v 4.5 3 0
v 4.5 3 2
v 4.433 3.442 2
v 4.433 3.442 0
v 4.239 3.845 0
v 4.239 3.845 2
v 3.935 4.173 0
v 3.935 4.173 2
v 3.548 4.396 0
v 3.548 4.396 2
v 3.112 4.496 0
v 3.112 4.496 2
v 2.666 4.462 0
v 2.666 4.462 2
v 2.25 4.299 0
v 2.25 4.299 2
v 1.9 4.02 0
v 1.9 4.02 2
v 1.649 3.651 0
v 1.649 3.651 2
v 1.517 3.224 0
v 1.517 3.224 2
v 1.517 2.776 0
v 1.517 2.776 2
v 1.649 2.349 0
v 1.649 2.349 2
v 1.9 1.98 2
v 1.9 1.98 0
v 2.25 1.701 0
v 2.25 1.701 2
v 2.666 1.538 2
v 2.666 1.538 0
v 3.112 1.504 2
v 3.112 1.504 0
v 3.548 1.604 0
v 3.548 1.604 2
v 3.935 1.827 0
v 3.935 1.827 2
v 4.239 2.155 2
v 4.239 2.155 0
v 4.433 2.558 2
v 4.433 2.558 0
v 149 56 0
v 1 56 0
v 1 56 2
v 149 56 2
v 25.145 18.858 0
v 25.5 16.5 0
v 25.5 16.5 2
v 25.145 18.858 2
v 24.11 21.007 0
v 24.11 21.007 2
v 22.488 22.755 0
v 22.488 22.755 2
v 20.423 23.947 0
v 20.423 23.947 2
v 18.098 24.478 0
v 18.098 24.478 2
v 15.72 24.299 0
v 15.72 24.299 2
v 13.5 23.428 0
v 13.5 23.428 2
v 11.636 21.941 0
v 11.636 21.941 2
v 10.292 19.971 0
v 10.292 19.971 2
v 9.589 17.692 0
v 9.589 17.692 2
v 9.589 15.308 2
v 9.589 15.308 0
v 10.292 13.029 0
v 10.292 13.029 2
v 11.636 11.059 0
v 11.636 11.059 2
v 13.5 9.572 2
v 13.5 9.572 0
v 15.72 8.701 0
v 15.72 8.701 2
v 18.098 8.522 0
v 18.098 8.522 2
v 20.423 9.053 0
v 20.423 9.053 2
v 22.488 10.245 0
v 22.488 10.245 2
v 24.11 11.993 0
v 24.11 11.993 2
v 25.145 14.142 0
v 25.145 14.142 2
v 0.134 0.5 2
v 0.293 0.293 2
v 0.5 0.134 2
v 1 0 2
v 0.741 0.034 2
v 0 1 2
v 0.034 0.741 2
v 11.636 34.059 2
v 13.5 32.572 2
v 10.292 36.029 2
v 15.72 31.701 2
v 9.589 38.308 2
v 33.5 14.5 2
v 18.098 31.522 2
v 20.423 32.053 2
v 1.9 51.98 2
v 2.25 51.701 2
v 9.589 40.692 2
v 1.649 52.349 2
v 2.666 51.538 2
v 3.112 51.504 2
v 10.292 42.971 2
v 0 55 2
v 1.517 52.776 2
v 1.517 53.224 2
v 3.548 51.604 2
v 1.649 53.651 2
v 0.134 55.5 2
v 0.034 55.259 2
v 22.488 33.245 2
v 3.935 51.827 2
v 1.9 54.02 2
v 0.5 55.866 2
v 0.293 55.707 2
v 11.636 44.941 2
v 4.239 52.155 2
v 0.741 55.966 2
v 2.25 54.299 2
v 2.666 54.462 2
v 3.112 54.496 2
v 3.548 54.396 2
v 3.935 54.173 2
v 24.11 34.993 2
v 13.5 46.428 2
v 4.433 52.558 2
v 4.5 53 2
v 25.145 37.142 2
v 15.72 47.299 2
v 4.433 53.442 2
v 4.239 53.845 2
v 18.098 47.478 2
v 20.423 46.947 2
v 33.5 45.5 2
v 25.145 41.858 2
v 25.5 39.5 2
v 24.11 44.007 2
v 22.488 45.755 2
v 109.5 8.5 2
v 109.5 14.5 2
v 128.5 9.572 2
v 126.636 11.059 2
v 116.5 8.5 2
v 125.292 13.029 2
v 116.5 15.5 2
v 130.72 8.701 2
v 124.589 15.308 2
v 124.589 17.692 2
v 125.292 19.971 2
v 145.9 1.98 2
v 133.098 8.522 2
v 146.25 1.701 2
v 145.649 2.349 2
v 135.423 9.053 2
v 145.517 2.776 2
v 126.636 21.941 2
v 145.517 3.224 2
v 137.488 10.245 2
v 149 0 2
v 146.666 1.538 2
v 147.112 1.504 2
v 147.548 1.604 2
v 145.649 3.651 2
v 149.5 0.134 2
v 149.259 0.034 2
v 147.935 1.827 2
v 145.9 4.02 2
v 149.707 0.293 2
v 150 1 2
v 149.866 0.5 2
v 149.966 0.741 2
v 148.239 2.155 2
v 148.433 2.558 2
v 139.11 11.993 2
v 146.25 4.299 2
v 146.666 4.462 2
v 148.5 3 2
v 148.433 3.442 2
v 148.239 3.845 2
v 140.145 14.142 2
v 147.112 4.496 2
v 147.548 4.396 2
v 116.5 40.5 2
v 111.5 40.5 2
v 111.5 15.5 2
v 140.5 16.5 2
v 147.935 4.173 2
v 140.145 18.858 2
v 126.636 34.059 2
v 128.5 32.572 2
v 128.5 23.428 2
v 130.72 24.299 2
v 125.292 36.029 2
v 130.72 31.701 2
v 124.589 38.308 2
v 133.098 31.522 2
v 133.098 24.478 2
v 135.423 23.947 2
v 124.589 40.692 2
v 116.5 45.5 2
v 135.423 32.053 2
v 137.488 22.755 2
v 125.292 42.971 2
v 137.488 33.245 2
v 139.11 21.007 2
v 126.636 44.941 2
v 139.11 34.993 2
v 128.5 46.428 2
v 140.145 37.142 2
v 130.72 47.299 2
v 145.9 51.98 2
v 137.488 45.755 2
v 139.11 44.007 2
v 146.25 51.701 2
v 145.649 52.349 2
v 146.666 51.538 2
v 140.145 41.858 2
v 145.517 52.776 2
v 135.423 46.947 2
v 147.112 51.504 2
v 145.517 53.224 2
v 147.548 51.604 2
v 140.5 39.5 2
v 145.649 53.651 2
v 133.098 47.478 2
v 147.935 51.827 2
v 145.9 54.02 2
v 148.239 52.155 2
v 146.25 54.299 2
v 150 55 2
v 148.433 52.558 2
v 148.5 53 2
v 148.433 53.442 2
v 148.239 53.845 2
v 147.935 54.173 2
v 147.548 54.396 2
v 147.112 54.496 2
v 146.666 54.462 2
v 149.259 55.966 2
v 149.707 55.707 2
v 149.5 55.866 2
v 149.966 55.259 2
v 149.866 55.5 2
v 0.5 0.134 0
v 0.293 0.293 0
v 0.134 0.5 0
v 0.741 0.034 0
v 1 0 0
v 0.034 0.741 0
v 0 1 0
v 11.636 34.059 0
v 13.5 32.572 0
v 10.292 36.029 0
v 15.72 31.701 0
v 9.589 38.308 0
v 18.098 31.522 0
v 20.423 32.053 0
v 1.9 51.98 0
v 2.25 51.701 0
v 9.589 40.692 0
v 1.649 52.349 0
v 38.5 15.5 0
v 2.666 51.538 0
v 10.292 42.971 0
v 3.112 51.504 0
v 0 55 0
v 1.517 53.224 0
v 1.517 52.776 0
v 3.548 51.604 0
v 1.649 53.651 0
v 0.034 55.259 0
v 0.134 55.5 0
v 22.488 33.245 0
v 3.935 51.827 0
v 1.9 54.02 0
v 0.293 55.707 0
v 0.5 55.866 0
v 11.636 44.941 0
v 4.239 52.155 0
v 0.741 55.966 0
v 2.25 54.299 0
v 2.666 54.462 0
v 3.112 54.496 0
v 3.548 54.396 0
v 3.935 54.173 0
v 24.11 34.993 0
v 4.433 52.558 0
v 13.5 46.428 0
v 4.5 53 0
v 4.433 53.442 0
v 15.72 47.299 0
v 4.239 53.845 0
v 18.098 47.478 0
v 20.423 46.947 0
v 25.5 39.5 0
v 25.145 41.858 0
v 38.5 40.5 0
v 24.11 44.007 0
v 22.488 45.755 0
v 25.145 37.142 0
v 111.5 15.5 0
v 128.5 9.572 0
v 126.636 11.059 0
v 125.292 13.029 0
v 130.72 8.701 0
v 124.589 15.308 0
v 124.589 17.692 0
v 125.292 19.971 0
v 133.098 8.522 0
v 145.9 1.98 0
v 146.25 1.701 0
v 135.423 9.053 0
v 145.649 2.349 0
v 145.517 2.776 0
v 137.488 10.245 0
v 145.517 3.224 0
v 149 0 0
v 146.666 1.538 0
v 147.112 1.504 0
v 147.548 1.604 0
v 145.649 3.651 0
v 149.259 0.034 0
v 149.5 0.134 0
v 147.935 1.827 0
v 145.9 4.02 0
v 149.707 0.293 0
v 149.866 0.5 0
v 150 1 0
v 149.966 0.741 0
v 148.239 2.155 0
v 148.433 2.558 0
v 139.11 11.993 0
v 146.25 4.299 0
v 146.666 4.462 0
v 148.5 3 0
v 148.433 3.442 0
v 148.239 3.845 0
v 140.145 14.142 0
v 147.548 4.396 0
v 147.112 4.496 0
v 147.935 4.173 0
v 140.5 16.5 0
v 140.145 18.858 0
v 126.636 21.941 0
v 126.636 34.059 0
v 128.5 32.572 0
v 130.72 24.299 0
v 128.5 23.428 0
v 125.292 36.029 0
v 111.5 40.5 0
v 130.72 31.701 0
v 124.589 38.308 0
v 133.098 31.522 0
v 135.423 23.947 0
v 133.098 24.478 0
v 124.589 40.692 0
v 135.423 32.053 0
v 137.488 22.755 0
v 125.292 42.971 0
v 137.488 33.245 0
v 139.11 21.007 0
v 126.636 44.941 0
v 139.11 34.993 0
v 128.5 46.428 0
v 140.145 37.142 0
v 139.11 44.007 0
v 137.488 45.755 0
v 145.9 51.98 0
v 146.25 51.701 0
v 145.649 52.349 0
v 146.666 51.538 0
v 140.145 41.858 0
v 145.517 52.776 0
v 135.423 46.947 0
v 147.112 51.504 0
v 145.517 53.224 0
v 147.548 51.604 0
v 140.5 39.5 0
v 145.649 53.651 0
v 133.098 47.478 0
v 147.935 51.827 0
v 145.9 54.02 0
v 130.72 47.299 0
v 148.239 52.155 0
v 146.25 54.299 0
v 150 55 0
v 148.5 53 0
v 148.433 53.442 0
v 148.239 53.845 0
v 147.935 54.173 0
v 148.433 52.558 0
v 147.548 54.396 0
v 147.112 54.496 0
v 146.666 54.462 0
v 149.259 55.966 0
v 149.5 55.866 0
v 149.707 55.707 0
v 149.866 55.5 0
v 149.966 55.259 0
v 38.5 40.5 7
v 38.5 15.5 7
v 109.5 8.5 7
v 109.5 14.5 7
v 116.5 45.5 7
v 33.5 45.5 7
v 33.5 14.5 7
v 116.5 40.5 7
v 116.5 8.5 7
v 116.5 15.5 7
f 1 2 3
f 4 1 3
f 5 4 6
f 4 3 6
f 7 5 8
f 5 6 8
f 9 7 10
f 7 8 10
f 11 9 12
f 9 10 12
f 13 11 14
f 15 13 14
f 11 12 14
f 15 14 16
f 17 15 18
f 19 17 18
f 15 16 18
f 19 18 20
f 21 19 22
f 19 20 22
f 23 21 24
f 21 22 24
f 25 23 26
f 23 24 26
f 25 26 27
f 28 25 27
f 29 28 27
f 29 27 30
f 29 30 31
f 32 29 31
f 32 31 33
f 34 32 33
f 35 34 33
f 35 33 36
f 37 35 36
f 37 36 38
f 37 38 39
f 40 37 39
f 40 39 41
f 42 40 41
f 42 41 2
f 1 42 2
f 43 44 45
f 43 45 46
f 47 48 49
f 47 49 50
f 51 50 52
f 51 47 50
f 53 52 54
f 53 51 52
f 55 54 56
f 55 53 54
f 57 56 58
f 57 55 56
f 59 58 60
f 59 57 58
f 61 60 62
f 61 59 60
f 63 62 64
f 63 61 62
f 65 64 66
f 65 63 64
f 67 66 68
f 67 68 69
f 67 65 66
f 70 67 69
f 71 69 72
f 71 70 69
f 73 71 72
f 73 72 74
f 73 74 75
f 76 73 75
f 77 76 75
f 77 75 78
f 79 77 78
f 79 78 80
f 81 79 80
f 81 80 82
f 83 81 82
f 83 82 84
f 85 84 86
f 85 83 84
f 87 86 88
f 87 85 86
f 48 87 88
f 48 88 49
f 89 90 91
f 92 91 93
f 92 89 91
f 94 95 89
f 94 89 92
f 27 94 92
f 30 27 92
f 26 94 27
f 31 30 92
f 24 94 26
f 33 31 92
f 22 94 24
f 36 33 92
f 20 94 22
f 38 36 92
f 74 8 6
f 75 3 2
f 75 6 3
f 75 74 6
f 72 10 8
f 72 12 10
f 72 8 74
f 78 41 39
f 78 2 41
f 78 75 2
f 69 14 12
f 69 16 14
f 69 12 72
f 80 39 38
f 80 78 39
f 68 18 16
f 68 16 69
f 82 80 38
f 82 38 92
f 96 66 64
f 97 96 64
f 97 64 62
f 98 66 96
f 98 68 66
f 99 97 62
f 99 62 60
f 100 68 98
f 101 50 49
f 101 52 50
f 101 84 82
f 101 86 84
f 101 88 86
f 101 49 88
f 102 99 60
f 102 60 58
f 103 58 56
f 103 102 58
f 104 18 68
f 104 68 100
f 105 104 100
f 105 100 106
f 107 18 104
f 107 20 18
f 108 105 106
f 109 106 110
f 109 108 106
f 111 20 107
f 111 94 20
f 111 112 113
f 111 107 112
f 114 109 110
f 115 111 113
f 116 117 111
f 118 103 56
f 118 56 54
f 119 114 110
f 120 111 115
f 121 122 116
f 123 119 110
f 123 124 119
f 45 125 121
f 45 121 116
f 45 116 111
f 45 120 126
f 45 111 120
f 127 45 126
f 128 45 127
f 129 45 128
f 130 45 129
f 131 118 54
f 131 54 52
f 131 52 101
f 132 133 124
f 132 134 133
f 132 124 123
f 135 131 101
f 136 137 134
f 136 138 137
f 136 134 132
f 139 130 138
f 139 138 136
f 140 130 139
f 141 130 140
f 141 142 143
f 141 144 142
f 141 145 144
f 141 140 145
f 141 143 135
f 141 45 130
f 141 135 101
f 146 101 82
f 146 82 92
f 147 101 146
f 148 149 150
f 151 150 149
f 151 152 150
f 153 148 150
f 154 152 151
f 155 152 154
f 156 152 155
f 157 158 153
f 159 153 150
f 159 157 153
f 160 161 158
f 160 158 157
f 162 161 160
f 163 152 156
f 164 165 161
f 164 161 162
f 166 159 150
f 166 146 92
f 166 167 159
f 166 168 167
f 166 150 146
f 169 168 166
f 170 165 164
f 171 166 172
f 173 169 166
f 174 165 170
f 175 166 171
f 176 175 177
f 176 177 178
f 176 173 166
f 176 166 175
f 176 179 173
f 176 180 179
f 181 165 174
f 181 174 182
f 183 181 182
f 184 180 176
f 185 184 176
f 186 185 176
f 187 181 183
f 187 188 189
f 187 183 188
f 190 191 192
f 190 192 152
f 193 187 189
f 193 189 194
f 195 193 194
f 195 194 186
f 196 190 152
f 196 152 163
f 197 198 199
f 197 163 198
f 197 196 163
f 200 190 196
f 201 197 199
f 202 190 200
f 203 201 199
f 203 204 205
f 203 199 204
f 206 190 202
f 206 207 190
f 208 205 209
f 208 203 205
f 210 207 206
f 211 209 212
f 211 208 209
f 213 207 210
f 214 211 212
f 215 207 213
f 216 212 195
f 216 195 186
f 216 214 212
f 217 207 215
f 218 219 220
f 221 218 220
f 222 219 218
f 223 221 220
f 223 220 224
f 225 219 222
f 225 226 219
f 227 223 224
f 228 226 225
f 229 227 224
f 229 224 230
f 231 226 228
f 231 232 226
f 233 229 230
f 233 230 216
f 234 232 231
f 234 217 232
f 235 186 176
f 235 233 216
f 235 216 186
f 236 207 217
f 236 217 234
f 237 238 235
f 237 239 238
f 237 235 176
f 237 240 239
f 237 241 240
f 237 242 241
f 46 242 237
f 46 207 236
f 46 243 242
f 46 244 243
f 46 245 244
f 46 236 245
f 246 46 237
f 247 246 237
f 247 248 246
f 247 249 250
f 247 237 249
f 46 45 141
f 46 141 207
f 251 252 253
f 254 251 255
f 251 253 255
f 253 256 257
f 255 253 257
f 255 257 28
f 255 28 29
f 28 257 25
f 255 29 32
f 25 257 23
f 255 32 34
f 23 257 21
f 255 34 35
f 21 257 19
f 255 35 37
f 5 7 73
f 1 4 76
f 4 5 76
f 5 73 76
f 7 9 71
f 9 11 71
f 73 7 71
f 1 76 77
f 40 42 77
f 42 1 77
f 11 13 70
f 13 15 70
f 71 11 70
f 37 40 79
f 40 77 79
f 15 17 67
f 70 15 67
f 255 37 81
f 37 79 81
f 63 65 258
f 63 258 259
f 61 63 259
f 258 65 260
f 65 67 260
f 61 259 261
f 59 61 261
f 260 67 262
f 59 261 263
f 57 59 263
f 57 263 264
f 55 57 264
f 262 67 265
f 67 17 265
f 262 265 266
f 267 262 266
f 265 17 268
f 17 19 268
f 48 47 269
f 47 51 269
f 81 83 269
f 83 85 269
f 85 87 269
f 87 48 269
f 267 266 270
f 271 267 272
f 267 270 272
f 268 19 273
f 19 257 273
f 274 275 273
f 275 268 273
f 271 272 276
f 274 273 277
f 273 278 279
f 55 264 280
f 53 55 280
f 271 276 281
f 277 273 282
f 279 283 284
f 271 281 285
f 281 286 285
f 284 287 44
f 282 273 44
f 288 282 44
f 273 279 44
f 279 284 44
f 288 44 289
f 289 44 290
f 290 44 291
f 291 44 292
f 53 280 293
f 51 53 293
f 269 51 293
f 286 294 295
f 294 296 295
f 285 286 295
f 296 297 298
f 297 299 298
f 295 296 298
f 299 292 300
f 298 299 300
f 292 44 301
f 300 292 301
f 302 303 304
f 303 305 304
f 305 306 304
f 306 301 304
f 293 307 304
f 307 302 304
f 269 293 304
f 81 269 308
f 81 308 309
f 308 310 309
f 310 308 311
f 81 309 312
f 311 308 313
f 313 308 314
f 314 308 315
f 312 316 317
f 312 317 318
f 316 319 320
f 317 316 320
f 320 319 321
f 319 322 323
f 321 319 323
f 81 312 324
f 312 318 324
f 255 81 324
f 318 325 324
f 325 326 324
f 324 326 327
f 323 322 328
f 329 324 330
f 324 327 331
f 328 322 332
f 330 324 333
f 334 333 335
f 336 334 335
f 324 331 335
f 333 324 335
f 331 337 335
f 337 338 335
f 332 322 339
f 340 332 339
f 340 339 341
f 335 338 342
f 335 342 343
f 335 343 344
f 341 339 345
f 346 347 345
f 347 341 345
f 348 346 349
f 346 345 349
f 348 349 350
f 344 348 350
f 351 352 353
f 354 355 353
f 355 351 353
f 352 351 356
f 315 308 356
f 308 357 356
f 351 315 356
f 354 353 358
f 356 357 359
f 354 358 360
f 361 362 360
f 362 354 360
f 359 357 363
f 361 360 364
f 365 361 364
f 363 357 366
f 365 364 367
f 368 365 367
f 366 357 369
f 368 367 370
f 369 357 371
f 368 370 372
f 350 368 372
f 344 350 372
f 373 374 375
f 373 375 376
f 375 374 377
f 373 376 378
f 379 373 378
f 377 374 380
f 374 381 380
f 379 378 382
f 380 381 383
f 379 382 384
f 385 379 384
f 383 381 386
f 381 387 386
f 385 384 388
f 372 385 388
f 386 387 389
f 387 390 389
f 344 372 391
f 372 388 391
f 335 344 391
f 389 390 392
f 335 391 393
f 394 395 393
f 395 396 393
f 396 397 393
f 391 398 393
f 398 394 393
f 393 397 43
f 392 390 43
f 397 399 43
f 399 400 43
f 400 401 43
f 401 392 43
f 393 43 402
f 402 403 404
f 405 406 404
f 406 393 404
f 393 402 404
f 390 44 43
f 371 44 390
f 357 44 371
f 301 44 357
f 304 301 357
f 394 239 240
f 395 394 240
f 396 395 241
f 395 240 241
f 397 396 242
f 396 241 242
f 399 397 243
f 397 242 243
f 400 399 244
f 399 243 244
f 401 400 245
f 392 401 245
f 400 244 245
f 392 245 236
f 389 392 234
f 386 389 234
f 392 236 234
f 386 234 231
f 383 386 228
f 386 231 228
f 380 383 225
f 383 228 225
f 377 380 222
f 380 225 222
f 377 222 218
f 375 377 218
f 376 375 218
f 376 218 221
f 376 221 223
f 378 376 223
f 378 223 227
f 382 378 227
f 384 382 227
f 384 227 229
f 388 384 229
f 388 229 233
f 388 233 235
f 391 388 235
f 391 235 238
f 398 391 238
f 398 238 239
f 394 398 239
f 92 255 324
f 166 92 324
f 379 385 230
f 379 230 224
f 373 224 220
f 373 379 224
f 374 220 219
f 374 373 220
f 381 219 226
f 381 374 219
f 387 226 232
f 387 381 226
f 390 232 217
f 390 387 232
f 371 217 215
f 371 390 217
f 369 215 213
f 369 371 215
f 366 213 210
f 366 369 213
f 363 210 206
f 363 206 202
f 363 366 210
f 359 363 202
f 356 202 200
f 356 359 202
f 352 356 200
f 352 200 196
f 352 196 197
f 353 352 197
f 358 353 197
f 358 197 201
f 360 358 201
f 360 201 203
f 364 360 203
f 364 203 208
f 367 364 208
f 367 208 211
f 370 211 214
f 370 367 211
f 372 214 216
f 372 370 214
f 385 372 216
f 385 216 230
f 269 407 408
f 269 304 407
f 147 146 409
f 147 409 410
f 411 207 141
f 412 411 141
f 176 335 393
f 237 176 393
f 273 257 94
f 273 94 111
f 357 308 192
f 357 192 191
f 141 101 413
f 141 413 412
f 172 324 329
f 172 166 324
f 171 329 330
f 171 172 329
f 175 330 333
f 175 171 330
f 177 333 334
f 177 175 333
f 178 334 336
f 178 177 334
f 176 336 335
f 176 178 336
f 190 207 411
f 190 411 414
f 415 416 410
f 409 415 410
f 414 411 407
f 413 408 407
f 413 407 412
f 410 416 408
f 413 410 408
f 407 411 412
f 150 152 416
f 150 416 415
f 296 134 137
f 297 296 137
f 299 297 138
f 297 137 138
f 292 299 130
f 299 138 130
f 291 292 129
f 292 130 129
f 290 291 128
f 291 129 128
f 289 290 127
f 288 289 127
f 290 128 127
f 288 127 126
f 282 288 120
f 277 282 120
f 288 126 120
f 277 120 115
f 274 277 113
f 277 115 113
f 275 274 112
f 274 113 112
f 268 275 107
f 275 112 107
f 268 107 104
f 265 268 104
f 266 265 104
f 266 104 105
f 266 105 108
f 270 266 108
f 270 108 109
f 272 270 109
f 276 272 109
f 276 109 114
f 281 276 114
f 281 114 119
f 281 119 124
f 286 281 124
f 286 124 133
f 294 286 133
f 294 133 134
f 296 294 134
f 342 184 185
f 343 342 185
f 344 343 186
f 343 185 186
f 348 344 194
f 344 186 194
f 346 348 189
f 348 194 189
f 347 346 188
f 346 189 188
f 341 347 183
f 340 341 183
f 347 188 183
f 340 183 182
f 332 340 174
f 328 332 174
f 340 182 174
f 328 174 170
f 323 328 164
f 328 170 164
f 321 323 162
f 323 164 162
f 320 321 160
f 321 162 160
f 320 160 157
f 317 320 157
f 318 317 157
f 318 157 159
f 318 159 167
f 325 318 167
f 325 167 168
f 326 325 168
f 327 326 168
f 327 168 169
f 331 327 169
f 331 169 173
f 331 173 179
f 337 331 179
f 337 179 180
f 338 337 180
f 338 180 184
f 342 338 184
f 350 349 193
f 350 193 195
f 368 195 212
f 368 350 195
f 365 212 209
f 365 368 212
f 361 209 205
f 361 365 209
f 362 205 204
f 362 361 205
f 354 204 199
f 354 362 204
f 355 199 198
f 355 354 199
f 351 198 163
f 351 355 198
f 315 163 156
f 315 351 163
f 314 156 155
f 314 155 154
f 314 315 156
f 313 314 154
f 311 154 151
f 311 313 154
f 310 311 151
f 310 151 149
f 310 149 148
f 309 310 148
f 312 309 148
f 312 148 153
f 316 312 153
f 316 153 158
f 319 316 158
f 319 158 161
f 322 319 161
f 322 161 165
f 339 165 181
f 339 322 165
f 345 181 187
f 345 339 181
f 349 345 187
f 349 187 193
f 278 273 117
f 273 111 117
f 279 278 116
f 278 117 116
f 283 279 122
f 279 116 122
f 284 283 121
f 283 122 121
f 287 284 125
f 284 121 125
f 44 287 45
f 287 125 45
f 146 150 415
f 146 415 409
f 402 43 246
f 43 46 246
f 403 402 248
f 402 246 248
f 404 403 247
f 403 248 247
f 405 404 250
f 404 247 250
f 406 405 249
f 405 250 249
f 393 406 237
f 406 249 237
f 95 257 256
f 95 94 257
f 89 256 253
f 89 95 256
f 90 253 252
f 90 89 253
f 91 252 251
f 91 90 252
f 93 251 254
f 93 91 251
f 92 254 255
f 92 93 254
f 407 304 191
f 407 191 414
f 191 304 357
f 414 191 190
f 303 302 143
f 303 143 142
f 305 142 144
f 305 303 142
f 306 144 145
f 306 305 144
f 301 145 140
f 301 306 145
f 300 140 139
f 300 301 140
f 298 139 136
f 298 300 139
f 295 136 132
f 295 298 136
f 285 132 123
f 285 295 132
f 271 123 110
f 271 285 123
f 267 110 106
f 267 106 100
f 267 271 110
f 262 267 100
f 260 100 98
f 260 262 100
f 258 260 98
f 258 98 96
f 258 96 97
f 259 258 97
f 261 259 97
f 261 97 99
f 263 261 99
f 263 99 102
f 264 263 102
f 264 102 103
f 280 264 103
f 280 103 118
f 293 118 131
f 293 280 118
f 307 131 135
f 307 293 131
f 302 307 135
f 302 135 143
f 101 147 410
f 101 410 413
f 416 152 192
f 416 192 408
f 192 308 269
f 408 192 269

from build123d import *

# Parameters (mm, degrees)
SKETCH_W     = 150
SKETCH_H     = 56
SKETCH_R     = 8
SKETCH_W_2   = 73
SKETCH_H_2   = 25
PAD_DEPTH    = 2
PAD001_DEPTH = 5
SKETCH002_R  = 1.5
POCKET_DEPTH = 5
FILLET_R     = 1


with BuildPart() as part:
    # Sketch → Pad (new body)
    with BuildSketch(Plane.XY):
        with Locations((75, 28)):
            Rectangle(SKETCH_W, SKETCH_H)
        with Locations((17.5, 16.5)):
            Circle(SKETCH_R, mode=Mode.SUBTRACT)
        with Locations((17.5, 39.5)):
            Circle(SKETCH_R, mode=Mode.SUBTRACT)
        with Locations((132.5, 16.5)):
            Circle(SKETCH_R, mode=Mode.SUBTRACT)
        with Locations((132.5, 39.5)):
            Circle(SKETCH_R, mode=Mode.SUBTRACT)
        with Locations((75, 28)):
            Rectangle(SKETCH_W_2, SKETCH_H_2, mode=Mode.SUBTRACT)
    extrude(amount=PAD_DEPTH)

    # Sketch001 (on Face14 of Pad) → Pad001 (join)
    with BuildSketch(Plane.XY.offset(2)):
        Polygon((38.5, 15.5), (111.5, 15.5), (116.5, 15.5), (116.5, 8.5), (109.5, 8.5), (109.5, 14.5), (33.5, 14.5), (33.5, 45.5), (111.5, 45.5), (116.5, 45.5), (116.5, 40.5), (111.5, 40.5), (38.5, 40.5), align=None)
    extrude(amount=PAD001_DEPTH)

    # Sketch002 (on Face5 of Pad001) → Pocket (cut)
    with BuildSketch(Plane.XY.offset(2)):
        with Locations((3, 53)):
            Circle(SKETCH002_R)
        with Locations((147, 53)):
            Circle(SKETCH002_R)
        with Locations((3, 3)):
            Circle(SKETCH002_R)
        with Locations((147, 3)):
            Circle(SKETCH002_R)
    extrude(amount=-POCKET_DEPTH, mode=Mode.SUBTRACT)

    # Fillet
    fillet_edges = [part.edges().sort_by_distance(p)[0] for p in [
        (0, 0, 1),
        (150, 0, 1),
        (150, 56, 1),
        (0, 56, 1),
    ]]
    fillet(fillet_edges, radius=FILLET_R)


solid = part.part
